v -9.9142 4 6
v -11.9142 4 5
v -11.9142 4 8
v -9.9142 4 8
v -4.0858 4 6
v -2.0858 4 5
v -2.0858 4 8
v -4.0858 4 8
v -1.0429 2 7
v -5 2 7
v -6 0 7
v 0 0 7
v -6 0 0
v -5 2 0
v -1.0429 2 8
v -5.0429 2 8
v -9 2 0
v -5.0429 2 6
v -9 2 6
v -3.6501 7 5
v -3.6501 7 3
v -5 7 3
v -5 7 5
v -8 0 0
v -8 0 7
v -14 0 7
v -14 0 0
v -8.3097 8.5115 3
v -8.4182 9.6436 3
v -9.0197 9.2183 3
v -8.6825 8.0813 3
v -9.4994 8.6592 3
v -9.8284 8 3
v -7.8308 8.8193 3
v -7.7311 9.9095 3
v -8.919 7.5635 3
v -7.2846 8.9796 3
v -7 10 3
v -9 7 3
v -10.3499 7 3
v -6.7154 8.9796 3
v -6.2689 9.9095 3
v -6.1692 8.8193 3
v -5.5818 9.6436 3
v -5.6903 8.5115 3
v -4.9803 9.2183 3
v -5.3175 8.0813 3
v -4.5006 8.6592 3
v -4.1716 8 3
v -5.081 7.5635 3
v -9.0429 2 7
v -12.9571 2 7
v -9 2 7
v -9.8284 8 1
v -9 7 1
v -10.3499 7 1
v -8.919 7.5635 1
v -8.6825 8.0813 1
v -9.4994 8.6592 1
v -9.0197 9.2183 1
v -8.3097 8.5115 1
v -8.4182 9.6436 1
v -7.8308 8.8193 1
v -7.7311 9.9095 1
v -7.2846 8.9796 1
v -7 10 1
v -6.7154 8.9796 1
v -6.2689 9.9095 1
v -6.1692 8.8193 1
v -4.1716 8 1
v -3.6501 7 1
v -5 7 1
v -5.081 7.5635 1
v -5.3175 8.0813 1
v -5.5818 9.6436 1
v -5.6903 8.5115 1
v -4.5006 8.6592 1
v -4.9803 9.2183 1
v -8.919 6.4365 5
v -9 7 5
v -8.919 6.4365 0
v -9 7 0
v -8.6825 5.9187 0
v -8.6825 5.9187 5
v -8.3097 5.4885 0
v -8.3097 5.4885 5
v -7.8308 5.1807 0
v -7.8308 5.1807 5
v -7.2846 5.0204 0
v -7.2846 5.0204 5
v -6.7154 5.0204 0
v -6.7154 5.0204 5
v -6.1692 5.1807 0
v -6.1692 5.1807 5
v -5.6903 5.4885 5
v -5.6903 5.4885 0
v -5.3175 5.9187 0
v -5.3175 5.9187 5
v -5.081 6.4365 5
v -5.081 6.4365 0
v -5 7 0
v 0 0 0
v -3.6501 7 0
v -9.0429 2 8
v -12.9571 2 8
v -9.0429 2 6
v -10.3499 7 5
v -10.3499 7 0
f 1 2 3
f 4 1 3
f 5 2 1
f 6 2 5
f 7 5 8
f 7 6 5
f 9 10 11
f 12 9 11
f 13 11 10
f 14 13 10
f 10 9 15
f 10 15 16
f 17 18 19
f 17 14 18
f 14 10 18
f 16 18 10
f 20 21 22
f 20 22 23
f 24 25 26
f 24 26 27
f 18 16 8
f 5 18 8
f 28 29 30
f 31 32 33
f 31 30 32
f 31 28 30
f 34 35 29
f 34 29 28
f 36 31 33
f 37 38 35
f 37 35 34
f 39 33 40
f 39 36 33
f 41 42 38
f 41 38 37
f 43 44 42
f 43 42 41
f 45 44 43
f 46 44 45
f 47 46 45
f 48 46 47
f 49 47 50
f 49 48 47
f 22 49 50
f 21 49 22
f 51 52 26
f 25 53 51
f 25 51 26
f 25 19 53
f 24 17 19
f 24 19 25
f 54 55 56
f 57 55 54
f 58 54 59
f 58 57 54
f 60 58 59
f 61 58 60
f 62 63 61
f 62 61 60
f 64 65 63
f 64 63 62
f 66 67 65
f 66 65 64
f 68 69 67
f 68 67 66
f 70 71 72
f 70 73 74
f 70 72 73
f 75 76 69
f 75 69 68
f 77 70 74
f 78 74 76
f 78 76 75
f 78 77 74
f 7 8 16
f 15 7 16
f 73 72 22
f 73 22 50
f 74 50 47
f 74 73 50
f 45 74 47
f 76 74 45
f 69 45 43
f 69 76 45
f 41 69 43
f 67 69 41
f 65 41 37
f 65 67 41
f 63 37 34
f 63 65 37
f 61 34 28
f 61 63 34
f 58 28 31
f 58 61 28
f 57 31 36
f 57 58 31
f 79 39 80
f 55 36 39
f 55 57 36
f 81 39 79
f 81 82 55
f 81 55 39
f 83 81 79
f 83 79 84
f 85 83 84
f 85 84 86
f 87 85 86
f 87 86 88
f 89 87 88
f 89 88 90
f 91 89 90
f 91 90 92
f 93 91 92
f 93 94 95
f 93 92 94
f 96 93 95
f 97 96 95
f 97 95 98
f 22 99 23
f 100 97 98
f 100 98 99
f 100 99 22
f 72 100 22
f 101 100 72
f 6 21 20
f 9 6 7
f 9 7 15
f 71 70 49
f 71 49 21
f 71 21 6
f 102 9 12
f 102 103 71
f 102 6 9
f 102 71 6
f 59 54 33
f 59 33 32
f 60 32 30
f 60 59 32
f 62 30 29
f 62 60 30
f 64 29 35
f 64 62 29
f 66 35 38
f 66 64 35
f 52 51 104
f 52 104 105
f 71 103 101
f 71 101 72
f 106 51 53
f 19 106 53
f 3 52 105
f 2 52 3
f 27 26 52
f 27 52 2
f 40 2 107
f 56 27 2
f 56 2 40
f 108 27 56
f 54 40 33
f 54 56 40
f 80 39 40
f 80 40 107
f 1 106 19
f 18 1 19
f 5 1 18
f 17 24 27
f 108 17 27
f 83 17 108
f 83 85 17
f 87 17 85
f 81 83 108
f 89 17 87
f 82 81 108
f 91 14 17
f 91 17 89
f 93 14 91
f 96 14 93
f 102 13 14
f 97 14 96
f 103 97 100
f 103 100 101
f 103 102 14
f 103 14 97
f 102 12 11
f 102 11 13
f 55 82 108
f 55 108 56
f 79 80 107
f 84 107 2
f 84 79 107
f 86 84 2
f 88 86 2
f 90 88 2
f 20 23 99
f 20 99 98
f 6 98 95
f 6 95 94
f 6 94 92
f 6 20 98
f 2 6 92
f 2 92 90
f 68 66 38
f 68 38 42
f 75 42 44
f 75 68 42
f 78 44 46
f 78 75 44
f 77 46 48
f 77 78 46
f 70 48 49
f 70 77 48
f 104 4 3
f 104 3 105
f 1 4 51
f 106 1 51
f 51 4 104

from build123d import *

# Parameters (mm, degrees)
BOSS_EXTRUDE1_DEPTH    = 14
CUT_EXTRUDE1_START     = -8
CUT_EXTRUDE1_OUTLINE_R = 2
CUT_EXTRUDE1_DEPTH     = 8
CUT_EXTRUDE2_DEPTH     = 2


# Read off the part's stored shape, not the designer's step: Cut-Extrude1
with BuildPart() as part:
    # Sketch2 → Boss-Extrude1 (new body)
    with BuildSketch(Plane(origin=(0, 0, 0), x_dir=(0, 0, -1), z_dir=(1, 0, 0))):
        Polygon((0, 0), (0, 7), (-1, 7), (-1, 10), (-3, 10), (-3, 7), (-5, 7), (-5, 4), (-8, 4), (-8, 2), (-7, 2), (-7, 0), align=None)
    extrude(amount=-BOSS_EXTRUDE1_DEPTH)

    # Cut-Extrude1 outline → Cut-Extrude1 (cut)
    with BuildSketch(Plane.XY.offset(8).offset(CUT_EXTRUDE1_START)):
        with BuildLine():
            Line((-14, 0), (-9.828427125, 8))
            ThreePointArc((-9.828427125, 8), (-8.732050808, 9.449489743), (-7, 10))
            Line((-7, 10), (-14, 10))
            Line((-14, 10), (-14, 0))
        make_face()
        Polygon((-5, 2), (-9, 2), (-8, 0), (-6, 0), align=None)
        with BuildLine():
            Line((0, 0), (0, 10))
            Line((0, 10), (-7, 10))
            ThreePointArc((-7, 10), (-5.267949192, 9.449489743), (-4.171572875, 8))
            Line((-4.171572875, 8), (0, 0))
        make_face()
        with Locations((-7, 7)):
            Circle(CUT_EXTRUDE1_OUTLINE_R)
    extrude(amount=CUT_EXTRUDE1_DEPTH, mode=Mode.SUBTRACT)

    # Sketch4 → Cut-Extrude2 (cut)
    with BuildSketch(Plane.XY.offset(8)):
        Polygon((-9.914213562, 4), (-9.042893219, 2), (-5.042893219, 2), (-4.085786438, 4), align=None)
    extrude(amount=-CUT_EXTRUDE2_DEPTH, mode=Mode.SUBTRACT)


solid = part.part
